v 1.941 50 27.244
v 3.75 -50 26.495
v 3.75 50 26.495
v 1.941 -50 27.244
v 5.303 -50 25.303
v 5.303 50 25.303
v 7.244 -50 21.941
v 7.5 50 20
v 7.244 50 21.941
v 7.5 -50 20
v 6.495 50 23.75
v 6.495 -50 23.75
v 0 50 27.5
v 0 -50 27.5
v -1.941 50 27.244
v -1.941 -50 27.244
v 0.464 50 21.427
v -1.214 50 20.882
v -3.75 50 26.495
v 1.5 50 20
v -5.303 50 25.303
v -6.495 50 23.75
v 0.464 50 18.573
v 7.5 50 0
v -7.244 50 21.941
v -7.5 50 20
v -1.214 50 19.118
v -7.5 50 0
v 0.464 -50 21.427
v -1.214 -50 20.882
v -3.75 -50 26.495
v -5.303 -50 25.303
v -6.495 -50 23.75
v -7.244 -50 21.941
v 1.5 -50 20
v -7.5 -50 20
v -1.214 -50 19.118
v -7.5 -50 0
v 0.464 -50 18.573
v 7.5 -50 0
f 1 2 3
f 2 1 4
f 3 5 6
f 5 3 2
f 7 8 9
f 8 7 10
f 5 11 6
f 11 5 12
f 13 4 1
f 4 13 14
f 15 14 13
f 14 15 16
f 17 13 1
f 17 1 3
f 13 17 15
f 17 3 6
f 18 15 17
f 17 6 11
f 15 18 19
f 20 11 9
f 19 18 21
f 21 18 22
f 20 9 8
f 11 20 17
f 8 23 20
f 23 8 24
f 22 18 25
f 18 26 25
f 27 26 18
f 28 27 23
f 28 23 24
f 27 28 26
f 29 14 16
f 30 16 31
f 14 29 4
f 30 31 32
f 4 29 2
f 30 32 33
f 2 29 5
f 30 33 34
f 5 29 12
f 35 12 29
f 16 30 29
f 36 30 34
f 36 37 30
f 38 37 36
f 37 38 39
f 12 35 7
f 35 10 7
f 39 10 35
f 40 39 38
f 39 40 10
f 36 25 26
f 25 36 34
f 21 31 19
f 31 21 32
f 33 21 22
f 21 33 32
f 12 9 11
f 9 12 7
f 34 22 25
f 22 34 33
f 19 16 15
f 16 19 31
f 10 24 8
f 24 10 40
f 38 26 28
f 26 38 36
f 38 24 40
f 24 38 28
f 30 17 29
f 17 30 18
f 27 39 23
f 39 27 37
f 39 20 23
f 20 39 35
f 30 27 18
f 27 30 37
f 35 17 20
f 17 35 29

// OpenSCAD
module original_cod() {
    h1 = 5; // cylinder height 1
        
    h2 = 6;
    h3 = 2;

    d2 = 50;
    dm = 0;
    d3 = 50.0 - h2/0.707;

    union() {
        cylinder(h=h2, d1=50+dm, d2=d3, $fn=100);
        translate([0,0,h2]) cylinder(h=h3, d1=d3+dm, d2=d3+dm, $fn=100);
    }
}

module cap() {
    intersection() {
        original_cod();
        cylinder(d=100, h=2.8);
    }

}


module rod() {
    intersection() {
        union() {
            original_cod();
        }
        translate([0,0,3]) cylinder(d=100, h=100);
    }
}

// cap();
// rod();

module joint(hd = 3, dh=20, d=15) {
    lg = 100;
    
    translate([0,0,dh]) rotate([-90,0,0]) difference() {
        union() {
            cylinder(d=d, h=lg, center=true);
            translate([-d/2, 0, -lg/2]) cube([d, dh, lg]);
        }
        cylinder(d=hd, h=lg, center=true);
    }
}

joint();
